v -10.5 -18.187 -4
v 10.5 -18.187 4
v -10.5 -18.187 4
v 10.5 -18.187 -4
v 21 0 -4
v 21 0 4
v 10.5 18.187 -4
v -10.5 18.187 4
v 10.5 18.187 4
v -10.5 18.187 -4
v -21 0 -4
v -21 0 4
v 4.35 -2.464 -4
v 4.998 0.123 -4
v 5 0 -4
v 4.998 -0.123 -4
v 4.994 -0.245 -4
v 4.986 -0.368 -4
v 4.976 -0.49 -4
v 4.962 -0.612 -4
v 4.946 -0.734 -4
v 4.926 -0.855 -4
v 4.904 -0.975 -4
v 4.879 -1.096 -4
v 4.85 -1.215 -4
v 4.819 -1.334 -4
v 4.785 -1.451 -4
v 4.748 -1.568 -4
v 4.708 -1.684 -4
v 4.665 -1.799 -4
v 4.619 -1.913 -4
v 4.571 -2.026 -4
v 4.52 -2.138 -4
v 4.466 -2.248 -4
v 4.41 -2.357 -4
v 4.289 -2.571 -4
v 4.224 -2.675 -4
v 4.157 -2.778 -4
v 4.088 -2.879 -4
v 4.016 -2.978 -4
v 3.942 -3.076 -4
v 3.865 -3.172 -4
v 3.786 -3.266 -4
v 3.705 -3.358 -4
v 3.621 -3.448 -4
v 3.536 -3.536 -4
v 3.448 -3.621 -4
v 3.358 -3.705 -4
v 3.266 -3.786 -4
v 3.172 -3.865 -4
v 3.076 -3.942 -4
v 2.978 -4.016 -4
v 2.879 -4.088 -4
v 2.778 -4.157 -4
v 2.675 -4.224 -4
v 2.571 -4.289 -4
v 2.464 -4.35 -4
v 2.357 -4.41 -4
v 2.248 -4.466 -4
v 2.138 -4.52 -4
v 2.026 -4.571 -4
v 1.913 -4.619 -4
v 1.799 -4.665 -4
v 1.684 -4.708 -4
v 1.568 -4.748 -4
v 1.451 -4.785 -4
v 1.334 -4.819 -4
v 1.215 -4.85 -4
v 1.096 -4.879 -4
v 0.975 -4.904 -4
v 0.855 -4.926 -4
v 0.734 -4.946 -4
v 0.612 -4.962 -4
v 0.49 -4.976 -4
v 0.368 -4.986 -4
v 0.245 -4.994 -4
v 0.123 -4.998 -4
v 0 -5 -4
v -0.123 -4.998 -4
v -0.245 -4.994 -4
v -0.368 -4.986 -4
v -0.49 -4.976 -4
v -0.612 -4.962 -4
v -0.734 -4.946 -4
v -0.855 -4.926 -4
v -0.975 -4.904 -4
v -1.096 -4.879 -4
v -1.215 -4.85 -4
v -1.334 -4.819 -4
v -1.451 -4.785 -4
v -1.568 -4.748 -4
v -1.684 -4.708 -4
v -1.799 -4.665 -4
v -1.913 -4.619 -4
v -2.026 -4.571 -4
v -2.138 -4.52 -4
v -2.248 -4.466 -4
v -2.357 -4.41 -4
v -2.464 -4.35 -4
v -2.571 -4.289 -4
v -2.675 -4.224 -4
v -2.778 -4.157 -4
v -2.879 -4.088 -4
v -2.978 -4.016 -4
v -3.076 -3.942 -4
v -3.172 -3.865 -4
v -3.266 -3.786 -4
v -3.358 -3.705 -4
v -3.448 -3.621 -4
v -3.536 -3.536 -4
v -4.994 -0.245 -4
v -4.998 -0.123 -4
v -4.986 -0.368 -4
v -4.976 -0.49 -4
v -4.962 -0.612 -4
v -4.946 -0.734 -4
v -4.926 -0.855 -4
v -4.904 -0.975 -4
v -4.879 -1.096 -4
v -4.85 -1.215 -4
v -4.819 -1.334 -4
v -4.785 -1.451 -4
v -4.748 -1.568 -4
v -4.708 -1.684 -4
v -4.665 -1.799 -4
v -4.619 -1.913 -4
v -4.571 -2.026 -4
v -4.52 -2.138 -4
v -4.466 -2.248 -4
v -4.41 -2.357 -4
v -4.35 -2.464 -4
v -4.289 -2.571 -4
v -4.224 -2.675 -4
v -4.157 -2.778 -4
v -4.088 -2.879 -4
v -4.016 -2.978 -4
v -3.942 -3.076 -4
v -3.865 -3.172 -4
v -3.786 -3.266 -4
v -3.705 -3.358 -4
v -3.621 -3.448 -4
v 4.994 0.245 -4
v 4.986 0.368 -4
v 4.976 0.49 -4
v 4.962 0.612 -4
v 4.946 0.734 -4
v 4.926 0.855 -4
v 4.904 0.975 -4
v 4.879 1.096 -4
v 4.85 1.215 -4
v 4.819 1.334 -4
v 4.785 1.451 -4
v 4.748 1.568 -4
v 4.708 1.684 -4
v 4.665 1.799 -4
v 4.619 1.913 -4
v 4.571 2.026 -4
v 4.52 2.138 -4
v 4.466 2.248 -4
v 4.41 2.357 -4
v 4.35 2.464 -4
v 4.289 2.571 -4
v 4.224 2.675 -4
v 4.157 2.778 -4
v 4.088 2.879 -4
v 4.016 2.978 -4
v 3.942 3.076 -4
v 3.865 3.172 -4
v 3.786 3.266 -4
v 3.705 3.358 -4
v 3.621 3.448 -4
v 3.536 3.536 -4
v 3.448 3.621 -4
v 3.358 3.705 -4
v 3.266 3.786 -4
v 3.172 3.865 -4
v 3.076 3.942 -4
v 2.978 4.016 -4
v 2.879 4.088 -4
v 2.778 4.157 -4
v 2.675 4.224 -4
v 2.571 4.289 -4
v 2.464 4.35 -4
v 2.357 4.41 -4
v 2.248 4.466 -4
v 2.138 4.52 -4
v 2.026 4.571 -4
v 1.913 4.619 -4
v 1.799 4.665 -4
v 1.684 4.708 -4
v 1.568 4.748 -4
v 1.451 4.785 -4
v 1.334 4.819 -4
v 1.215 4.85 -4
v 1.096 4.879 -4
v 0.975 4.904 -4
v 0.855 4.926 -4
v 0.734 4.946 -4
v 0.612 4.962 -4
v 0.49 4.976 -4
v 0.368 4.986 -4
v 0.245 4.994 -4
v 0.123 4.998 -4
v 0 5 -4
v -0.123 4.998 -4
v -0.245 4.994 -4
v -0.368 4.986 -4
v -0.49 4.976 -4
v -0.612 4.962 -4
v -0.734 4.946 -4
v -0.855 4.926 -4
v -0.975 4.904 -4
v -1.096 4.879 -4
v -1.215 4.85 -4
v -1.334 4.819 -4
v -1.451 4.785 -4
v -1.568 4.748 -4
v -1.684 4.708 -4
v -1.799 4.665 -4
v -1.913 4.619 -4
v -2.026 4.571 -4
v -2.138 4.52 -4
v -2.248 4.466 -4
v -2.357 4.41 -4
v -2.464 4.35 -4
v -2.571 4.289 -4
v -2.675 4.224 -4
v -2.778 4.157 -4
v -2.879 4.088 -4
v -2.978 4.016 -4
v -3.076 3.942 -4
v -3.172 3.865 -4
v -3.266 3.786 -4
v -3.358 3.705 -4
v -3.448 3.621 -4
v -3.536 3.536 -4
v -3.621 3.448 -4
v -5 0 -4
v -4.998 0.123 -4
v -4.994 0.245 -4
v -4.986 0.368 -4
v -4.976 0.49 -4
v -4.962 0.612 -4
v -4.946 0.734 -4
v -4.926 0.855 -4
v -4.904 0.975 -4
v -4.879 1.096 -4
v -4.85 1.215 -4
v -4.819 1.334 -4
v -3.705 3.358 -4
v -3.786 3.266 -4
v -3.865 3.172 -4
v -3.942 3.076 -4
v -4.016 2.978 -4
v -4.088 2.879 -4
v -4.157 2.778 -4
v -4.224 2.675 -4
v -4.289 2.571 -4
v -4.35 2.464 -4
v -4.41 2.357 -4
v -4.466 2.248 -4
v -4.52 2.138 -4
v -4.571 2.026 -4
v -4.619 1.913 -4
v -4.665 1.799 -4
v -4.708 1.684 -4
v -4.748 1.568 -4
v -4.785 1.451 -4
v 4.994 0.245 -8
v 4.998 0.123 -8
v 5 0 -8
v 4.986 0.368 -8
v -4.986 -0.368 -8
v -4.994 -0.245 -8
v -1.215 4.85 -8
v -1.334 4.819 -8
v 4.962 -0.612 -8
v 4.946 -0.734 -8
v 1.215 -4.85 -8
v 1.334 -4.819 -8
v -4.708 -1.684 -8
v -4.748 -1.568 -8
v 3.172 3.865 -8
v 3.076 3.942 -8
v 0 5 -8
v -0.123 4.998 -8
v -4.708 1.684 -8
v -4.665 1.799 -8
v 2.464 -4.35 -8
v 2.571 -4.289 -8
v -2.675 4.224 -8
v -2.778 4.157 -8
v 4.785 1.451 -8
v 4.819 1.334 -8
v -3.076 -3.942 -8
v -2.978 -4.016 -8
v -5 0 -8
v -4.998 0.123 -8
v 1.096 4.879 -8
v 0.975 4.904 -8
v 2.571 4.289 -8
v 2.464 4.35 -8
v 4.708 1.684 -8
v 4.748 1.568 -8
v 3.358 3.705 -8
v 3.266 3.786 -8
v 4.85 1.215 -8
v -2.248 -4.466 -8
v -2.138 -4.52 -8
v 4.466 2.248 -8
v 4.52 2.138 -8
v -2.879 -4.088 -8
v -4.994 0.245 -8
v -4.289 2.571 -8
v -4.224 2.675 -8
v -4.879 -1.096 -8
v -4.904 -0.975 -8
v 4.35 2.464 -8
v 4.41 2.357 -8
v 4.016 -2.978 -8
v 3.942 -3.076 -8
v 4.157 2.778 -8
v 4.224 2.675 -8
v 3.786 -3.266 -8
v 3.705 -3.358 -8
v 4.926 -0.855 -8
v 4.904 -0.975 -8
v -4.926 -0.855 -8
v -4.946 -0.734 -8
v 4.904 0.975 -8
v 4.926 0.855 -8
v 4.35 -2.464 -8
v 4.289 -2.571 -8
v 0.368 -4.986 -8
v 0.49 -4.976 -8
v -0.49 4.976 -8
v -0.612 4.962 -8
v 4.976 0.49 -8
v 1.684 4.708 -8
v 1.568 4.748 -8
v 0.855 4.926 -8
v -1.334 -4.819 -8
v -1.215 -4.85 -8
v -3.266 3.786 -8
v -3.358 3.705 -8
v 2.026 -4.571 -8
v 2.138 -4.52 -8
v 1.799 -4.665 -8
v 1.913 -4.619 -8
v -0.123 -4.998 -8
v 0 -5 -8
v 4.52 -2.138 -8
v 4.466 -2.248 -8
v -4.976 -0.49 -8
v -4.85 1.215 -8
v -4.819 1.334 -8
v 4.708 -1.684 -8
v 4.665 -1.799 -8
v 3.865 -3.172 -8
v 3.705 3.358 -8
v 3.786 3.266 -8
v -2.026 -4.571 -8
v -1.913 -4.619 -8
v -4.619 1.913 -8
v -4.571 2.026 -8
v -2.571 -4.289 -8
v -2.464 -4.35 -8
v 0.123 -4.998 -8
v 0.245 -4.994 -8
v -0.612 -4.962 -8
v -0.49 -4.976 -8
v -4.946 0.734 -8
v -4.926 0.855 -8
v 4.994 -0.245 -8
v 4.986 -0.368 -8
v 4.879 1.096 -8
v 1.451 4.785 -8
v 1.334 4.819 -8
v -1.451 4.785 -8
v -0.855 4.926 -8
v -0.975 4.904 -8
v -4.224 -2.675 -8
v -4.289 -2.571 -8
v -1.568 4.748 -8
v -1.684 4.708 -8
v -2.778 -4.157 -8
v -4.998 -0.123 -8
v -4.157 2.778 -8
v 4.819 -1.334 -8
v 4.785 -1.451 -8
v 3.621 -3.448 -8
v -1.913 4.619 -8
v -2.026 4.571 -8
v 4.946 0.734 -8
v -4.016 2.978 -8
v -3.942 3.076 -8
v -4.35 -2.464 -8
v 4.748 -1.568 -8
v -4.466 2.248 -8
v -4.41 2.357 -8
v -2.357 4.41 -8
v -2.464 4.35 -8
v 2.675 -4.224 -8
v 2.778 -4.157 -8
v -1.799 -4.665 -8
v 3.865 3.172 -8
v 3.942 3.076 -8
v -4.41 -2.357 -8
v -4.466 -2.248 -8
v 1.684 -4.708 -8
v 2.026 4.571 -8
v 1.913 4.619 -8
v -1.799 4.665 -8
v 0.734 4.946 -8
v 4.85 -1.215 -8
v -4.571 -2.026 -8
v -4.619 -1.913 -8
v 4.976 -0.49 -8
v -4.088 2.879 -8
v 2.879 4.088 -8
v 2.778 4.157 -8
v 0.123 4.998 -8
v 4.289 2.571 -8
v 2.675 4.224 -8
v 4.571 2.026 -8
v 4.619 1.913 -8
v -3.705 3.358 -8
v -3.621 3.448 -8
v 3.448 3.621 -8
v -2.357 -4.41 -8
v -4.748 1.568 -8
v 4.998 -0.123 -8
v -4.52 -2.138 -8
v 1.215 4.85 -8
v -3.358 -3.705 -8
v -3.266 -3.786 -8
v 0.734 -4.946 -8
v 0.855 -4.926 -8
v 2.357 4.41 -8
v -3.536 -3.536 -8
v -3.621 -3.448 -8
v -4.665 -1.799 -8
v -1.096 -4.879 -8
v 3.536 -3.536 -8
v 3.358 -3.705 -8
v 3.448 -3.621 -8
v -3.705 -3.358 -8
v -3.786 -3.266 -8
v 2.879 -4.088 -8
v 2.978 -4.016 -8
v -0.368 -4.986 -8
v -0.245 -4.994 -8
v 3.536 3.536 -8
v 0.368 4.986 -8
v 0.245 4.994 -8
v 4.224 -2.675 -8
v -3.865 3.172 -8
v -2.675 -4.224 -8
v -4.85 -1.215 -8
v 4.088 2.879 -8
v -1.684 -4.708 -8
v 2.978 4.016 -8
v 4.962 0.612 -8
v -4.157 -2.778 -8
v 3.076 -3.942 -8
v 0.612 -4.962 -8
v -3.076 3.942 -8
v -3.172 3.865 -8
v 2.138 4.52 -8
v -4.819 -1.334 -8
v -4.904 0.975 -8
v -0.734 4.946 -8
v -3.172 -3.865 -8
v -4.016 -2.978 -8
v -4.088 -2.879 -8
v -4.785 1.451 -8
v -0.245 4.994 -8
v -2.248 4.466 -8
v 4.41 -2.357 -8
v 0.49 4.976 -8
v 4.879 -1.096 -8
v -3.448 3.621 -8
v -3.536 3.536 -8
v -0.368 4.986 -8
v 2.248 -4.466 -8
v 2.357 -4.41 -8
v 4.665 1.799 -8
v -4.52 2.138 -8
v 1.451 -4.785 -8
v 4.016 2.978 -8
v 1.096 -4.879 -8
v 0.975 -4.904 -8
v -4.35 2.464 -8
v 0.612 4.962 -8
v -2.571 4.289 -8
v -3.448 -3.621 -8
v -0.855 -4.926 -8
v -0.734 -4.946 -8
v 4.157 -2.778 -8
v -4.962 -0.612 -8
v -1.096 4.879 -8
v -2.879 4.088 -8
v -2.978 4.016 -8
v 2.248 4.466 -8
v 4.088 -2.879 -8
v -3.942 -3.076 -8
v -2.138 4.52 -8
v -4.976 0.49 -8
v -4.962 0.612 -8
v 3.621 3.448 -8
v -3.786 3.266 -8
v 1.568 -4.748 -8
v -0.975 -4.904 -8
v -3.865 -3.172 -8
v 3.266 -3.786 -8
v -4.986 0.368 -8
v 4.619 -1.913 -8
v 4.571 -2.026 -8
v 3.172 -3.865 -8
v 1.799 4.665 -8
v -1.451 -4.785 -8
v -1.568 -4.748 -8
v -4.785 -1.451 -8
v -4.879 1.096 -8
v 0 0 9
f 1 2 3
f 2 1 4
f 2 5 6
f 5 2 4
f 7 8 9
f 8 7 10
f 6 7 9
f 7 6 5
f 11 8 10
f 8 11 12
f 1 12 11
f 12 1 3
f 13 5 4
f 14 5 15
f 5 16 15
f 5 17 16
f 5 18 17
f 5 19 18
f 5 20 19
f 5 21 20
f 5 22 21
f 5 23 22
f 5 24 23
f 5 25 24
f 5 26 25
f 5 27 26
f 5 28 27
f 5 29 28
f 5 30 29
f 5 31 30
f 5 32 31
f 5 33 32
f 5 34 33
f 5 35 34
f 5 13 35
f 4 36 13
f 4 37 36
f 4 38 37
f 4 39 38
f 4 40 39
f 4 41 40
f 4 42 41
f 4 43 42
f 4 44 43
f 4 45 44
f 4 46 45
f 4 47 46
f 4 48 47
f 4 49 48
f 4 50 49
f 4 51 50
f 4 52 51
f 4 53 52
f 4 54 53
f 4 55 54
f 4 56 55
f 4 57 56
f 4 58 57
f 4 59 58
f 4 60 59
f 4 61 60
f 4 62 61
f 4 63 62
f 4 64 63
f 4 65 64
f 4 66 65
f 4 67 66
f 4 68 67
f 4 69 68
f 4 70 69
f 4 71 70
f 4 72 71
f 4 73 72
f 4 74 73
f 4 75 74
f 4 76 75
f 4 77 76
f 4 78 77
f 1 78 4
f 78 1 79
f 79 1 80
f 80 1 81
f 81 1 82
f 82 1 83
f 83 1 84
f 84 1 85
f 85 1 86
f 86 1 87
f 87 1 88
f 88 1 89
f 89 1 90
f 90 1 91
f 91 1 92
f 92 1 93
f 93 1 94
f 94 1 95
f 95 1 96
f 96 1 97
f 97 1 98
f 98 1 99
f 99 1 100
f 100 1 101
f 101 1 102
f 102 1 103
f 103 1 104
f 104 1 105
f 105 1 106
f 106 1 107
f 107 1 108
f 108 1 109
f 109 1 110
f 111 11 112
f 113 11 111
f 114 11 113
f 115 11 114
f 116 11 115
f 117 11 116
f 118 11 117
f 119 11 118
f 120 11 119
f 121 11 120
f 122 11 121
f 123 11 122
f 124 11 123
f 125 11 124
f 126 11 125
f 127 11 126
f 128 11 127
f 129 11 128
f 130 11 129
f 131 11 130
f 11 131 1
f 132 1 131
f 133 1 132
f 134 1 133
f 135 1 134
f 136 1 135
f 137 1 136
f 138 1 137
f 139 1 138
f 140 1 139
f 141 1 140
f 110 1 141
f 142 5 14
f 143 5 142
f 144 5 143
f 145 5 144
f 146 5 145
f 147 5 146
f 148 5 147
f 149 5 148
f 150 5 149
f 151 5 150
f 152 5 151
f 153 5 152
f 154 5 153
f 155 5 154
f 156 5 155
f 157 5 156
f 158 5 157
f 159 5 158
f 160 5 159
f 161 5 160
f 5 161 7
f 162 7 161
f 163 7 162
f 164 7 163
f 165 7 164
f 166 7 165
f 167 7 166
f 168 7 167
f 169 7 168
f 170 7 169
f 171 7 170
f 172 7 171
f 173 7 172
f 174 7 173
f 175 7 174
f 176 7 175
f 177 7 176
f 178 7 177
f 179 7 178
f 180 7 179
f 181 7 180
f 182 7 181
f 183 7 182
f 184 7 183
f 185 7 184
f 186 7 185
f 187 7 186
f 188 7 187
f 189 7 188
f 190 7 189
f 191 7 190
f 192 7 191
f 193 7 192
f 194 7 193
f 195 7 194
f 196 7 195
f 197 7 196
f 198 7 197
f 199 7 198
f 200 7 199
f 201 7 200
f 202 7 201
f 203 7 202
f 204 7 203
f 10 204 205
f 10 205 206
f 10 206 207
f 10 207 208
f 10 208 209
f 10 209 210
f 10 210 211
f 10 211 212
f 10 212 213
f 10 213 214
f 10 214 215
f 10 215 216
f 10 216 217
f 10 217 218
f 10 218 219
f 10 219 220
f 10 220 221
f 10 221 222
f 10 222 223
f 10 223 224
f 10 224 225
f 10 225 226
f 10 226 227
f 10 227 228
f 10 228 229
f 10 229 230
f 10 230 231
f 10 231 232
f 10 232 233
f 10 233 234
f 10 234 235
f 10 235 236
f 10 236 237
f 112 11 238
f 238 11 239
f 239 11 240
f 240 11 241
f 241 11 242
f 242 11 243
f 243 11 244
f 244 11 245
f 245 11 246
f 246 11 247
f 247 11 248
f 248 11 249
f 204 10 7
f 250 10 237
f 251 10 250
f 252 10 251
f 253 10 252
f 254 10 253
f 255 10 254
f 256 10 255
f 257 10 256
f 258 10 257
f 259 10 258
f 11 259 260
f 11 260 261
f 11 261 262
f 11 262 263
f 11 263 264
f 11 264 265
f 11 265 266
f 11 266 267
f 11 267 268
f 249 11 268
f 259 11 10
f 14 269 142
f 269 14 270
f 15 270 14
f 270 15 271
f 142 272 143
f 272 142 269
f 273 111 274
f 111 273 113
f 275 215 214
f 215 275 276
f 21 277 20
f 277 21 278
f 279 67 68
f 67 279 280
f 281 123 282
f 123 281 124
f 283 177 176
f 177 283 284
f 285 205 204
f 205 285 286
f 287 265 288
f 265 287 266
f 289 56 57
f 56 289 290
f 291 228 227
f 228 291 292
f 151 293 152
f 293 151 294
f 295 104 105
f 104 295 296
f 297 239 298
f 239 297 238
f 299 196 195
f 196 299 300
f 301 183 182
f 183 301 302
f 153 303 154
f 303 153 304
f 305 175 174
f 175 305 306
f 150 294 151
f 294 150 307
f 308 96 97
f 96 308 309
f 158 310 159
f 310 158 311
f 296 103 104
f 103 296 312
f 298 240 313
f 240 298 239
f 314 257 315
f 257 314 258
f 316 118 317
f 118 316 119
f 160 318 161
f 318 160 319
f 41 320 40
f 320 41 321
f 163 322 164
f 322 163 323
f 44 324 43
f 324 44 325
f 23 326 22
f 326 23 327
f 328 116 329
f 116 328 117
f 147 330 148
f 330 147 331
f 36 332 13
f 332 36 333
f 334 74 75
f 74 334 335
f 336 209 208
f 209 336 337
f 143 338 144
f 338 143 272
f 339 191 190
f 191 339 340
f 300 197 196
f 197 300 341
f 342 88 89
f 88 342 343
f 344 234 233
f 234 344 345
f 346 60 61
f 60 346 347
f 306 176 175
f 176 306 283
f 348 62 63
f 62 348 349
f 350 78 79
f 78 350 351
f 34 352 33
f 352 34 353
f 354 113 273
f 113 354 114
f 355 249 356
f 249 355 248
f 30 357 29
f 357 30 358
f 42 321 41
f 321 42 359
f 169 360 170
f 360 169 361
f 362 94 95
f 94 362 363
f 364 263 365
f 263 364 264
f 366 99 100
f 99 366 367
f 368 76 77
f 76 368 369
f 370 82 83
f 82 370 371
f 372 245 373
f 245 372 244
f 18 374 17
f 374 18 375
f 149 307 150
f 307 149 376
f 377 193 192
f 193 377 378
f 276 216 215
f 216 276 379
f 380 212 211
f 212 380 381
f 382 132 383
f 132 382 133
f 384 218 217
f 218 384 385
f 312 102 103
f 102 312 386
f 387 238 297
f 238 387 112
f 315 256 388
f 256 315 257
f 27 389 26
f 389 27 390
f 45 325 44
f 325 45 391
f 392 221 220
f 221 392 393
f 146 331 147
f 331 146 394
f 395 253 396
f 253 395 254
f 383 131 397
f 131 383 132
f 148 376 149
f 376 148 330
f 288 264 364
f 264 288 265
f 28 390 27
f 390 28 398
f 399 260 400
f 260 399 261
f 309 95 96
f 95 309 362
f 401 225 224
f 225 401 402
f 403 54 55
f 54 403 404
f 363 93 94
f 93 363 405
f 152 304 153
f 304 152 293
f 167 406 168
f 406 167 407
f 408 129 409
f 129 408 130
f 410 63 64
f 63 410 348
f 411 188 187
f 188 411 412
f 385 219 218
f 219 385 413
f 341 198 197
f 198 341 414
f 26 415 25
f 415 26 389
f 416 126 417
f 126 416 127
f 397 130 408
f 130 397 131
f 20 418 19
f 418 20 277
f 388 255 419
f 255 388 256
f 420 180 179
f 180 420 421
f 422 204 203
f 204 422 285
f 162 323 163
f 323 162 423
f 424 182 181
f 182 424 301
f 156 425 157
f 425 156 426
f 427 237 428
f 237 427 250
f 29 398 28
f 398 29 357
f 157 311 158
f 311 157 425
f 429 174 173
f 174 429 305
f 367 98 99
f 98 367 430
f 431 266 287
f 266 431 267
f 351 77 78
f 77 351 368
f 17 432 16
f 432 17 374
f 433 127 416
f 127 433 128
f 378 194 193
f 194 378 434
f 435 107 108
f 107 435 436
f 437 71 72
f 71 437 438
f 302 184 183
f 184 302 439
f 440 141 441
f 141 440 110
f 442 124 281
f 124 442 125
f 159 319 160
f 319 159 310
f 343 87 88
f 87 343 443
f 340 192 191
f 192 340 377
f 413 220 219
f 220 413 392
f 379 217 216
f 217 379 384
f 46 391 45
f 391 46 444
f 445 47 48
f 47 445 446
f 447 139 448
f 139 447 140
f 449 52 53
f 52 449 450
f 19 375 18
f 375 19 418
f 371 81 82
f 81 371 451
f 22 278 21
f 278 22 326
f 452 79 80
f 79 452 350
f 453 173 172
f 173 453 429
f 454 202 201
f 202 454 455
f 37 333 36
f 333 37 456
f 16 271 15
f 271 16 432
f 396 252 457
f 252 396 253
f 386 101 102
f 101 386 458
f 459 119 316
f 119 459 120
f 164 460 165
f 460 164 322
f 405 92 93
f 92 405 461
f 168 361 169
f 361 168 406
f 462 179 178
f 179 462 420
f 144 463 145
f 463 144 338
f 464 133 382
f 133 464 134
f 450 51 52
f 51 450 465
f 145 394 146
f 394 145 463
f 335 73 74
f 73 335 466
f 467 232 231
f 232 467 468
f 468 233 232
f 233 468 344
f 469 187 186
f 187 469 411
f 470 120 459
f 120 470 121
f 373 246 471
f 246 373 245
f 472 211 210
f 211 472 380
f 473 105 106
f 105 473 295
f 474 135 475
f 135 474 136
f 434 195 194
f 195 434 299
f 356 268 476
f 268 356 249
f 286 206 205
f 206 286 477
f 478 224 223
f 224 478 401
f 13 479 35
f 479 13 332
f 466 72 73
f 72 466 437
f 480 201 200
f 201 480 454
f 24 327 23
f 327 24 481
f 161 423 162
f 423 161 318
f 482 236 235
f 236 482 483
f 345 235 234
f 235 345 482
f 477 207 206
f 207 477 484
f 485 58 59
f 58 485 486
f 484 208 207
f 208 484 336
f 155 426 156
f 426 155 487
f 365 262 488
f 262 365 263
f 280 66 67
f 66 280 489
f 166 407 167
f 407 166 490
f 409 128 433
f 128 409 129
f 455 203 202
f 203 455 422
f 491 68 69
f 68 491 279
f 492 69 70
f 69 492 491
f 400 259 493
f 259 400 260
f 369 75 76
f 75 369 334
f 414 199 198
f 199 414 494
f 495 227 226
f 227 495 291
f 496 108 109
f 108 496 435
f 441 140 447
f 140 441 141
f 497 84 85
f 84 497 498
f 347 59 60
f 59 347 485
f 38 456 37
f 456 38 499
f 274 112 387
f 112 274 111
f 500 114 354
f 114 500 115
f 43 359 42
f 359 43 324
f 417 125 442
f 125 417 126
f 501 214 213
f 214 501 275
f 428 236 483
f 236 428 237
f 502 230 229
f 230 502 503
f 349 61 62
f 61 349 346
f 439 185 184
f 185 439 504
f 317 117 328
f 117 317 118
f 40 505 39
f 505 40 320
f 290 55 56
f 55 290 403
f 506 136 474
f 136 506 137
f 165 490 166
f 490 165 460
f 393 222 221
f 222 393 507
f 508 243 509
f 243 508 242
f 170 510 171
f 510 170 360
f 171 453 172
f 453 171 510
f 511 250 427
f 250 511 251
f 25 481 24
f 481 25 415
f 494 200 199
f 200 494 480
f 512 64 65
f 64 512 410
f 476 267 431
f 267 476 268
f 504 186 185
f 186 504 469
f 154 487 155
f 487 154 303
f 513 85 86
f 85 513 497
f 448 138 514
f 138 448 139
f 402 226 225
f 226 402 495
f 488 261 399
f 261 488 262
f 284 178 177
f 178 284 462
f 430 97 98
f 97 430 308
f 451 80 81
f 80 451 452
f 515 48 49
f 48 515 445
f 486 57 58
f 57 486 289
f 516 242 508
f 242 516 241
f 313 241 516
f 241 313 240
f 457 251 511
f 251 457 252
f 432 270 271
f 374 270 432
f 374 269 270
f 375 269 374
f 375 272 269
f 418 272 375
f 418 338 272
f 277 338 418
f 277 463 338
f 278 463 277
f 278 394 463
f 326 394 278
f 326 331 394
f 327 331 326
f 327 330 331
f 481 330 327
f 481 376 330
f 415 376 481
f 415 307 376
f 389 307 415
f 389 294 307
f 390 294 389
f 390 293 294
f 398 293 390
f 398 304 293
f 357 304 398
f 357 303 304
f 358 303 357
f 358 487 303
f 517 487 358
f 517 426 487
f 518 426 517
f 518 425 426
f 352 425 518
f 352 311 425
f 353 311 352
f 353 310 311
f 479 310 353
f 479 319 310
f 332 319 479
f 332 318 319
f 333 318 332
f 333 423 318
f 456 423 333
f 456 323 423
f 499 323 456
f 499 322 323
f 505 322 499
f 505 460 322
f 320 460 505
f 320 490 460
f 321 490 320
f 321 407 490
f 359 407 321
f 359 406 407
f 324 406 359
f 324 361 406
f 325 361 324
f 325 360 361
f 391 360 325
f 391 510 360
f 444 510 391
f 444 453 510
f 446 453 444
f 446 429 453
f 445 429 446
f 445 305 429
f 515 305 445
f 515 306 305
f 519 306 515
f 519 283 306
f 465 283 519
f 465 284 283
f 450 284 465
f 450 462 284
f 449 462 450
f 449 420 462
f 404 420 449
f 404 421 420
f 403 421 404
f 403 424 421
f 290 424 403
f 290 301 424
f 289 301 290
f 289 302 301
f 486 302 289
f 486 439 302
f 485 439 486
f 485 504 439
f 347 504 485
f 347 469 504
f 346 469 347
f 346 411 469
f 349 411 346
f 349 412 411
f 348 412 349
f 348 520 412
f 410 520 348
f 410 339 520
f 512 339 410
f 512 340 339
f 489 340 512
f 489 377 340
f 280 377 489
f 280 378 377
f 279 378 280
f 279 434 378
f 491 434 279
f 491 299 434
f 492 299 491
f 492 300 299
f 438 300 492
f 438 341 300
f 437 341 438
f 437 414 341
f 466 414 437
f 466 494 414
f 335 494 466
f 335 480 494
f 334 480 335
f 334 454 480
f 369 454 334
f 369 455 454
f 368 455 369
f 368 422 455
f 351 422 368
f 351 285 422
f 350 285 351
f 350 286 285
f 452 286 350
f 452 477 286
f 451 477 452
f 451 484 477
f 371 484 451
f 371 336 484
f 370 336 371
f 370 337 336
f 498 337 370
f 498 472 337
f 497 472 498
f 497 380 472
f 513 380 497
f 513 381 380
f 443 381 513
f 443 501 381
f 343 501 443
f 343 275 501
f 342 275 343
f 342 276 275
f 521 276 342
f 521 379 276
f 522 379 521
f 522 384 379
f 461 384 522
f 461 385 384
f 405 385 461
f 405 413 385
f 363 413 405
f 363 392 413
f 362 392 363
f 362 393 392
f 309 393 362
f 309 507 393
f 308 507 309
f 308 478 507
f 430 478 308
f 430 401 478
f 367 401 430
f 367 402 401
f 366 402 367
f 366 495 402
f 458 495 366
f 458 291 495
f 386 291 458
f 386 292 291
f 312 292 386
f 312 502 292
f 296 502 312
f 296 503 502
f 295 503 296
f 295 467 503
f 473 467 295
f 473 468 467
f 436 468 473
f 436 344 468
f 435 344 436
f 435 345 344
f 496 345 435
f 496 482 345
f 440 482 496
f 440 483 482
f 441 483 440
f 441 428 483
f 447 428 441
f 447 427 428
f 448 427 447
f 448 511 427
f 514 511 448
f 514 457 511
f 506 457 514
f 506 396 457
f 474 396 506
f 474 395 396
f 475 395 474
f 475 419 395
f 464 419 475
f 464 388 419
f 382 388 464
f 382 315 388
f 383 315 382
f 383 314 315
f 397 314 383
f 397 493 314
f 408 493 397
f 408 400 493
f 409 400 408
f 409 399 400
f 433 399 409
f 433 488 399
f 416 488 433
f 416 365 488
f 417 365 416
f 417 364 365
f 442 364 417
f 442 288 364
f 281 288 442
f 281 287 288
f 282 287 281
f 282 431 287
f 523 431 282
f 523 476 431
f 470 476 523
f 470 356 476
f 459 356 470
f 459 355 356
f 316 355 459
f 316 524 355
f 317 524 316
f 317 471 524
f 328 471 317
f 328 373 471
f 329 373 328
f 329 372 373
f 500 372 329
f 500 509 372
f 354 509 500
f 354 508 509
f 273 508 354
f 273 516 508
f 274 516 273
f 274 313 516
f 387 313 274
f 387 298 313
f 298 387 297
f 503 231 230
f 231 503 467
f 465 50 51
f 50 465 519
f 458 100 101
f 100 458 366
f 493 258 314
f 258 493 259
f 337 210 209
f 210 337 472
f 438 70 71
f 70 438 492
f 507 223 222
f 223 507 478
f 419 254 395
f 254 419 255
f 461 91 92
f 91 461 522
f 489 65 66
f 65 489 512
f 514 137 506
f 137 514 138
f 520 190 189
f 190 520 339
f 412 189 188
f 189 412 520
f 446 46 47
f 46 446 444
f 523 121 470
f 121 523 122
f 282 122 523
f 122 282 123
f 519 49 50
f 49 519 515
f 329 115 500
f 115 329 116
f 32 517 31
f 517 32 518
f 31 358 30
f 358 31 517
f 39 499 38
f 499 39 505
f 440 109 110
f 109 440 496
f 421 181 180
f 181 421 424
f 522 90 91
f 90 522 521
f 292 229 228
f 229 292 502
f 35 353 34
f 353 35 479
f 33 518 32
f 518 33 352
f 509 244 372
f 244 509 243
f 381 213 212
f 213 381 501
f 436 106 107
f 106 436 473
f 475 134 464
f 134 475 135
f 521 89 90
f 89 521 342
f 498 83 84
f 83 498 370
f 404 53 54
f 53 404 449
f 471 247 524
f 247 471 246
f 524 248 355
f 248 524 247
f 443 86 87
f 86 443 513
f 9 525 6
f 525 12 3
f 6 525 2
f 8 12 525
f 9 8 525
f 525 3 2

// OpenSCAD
union() {
	translate(v = [0, 0, 0]) {
		union() {
			translate(v = [0, 0, 0]) {
				cylinder($fn = 6, center = true, h = 8, r1 = 21, r2 = 21);
			}
			translate(v = [0, 0, -6.0000000000]) {
				cylinder($fn = 256, center = true, h = 4, r1 = 5, r2 = 5);
			}
		}
	}
	translate(v = [0, 0, 6.5000000000]) {
		cylinder($fn = 6, center = true, h = 5, r1 = 21, r2 = 0);
	}
}
/***********************************************
*********      SolidPython code:      **********
************************************************
 
from gen_block import make_block

__author__ = 'Mark Weinreuter'

from solid import scad_render_to_file

from config import *

tile_blocker_h_mm = 5
top = CY(r1=block_r_mm, r2=0, h=tile_blocker_h_mm, segments=6)

tile_blocker = make_block()
top.bottom = block_base_h_mm/2
tile_blocker += top
scad_render_to_file(tile_blocker, "scad/tile_blocker2.scad")
 
 
************************************************/
